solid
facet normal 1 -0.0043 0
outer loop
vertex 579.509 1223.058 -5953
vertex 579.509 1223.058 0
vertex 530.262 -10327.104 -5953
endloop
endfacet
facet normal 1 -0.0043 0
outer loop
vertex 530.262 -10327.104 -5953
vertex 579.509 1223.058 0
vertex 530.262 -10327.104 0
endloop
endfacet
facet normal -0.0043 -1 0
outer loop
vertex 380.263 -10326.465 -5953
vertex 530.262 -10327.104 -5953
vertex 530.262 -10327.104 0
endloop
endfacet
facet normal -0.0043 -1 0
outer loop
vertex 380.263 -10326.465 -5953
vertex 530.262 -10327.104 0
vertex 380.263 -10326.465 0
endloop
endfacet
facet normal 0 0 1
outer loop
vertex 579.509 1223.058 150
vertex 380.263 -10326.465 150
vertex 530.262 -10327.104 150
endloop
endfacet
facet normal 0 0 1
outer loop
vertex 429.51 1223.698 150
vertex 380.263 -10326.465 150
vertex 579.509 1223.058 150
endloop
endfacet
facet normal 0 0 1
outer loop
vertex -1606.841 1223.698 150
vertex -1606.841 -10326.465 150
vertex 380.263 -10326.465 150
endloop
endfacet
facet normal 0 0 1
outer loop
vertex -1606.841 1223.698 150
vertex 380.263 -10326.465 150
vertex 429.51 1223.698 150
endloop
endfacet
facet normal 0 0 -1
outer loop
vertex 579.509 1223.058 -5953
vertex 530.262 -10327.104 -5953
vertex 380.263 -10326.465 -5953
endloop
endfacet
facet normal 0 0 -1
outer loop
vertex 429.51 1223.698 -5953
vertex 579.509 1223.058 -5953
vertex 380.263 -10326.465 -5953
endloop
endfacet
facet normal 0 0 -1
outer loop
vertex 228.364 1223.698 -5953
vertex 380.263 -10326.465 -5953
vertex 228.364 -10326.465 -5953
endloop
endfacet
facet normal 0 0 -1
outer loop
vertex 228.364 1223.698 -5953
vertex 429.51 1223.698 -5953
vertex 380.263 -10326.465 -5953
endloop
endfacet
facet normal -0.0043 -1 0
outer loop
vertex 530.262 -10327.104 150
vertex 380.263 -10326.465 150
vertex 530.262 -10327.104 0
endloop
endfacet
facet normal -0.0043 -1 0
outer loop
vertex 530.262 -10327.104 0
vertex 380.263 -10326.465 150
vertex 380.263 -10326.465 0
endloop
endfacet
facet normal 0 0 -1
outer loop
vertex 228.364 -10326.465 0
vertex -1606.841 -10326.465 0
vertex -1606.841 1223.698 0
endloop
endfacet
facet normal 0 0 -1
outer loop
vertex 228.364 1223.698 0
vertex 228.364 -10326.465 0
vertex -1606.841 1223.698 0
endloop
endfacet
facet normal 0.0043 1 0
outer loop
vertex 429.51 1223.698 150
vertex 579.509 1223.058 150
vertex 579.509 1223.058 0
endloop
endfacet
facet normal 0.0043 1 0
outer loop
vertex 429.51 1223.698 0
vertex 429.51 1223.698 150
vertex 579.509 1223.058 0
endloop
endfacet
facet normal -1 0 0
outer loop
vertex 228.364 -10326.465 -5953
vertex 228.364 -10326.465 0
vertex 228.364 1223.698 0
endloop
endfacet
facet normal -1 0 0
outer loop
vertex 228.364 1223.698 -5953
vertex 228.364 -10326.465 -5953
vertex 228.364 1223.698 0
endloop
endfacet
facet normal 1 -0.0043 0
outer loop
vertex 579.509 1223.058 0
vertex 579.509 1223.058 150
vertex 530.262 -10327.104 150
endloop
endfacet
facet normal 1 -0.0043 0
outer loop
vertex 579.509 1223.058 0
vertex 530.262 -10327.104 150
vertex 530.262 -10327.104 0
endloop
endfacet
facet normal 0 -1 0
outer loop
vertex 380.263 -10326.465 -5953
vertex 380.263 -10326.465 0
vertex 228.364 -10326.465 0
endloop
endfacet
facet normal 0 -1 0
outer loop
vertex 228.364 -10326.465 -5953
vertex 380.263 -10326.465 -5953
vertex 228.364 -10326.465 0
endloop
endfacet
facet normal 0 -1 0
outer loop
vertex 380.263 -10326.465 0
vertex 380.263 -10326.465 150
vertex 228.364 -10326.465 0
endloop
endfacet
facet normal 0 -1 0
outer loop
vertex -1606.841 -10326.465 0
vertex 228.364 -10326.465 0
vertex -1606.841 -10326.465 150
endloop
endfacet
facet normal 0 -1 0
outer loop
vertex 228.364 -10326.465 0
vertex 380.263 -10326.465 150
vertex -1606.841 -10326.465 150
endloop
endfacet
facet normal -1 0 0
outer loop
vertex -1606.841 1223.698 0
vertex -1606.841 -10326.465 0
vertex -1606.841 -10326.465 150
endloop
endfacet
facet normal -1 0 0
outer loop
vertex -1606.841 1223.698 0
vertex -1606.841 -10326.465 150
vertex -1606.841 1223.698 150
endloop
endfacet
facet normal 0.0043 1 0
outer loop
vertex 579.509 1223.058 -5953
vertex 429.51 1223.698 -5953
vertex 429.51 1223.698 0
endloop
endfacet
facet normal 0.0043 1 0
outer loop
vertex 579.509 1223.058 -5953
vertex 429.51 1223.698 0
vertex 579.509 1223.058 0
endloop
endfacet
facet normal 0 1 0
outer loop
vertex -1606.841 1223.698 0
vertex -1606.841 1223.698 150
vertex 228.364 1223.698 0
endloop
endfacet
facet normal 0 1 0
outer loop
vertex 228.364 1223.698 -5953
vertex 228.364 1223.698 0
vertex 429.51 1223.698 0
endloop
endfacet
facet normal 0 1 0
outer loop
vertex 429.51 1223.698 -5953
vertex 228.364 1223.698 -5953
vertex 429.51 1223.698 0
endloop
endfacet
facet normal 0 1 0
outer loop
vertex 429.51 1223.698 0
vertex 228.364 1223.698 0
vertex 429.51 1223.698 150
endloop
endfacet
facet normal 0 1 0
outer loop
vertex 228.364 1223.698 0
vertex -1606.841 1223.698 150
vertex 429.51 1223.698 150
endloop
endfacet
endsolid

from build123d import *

# Parameters (mm, degrees)
BOSS_EXTRUDE1_DEPTH = 150
SKETCH2_W           = 150
SKETCH2_H           = 11550.267170743
BOSS_EXTRUDE2_DEPTH = 150
BOSS_EXTRUDE3_DEPTH = 5953


with BuildPart() as part:
    # Sketch1 → Boss-Extrude1 (new body)
    with BuildSketch(Plane.XY):
        Polygon((-1606.841446163, 1223.697519379), (429.510216102, 1223.697519379), (380.2634, -10326.464664185), (-1606.841446163, -10326.464664185), align=None)
    extrude(amount=BOSS_EXTRUDE1_DEPTH)

    # Sketch2 → Boss-Extrude2 (add)
    with BuildSketch(Plane(origin=(424.284982455, -1.809038191, 0), x_dir=(0, 0, -1), z_dir=(0.99999091, -0.004263695, 0))):
        with Locations((-75, -4549.615888349)):
            Rectangle(SKETCH2_W, SKETCH2_H)
    extrude(amount=BOSS_EXTRUDE2_DEPTH)

    # Sketch3 → Boss-Extrude3 (add)
    with BuildSketch(Plane(origin=(0, 0, 0), x_dir=(-1, 0, 0), z_dir=(0, 0, -1))):
        Polygon((-228.364442926, -10326.464664185), (-228.364442926, 1223.697519379), (-429.510216102, 1223.697519379), (-579.508852664, 1223.057965132), (-530.262036562, -10327.104218432), (-380.2634, -10326.464664185), align=None)
    extrude(amount=BOSS_EXTRUDE3_DEPTH)


solid = part.part
